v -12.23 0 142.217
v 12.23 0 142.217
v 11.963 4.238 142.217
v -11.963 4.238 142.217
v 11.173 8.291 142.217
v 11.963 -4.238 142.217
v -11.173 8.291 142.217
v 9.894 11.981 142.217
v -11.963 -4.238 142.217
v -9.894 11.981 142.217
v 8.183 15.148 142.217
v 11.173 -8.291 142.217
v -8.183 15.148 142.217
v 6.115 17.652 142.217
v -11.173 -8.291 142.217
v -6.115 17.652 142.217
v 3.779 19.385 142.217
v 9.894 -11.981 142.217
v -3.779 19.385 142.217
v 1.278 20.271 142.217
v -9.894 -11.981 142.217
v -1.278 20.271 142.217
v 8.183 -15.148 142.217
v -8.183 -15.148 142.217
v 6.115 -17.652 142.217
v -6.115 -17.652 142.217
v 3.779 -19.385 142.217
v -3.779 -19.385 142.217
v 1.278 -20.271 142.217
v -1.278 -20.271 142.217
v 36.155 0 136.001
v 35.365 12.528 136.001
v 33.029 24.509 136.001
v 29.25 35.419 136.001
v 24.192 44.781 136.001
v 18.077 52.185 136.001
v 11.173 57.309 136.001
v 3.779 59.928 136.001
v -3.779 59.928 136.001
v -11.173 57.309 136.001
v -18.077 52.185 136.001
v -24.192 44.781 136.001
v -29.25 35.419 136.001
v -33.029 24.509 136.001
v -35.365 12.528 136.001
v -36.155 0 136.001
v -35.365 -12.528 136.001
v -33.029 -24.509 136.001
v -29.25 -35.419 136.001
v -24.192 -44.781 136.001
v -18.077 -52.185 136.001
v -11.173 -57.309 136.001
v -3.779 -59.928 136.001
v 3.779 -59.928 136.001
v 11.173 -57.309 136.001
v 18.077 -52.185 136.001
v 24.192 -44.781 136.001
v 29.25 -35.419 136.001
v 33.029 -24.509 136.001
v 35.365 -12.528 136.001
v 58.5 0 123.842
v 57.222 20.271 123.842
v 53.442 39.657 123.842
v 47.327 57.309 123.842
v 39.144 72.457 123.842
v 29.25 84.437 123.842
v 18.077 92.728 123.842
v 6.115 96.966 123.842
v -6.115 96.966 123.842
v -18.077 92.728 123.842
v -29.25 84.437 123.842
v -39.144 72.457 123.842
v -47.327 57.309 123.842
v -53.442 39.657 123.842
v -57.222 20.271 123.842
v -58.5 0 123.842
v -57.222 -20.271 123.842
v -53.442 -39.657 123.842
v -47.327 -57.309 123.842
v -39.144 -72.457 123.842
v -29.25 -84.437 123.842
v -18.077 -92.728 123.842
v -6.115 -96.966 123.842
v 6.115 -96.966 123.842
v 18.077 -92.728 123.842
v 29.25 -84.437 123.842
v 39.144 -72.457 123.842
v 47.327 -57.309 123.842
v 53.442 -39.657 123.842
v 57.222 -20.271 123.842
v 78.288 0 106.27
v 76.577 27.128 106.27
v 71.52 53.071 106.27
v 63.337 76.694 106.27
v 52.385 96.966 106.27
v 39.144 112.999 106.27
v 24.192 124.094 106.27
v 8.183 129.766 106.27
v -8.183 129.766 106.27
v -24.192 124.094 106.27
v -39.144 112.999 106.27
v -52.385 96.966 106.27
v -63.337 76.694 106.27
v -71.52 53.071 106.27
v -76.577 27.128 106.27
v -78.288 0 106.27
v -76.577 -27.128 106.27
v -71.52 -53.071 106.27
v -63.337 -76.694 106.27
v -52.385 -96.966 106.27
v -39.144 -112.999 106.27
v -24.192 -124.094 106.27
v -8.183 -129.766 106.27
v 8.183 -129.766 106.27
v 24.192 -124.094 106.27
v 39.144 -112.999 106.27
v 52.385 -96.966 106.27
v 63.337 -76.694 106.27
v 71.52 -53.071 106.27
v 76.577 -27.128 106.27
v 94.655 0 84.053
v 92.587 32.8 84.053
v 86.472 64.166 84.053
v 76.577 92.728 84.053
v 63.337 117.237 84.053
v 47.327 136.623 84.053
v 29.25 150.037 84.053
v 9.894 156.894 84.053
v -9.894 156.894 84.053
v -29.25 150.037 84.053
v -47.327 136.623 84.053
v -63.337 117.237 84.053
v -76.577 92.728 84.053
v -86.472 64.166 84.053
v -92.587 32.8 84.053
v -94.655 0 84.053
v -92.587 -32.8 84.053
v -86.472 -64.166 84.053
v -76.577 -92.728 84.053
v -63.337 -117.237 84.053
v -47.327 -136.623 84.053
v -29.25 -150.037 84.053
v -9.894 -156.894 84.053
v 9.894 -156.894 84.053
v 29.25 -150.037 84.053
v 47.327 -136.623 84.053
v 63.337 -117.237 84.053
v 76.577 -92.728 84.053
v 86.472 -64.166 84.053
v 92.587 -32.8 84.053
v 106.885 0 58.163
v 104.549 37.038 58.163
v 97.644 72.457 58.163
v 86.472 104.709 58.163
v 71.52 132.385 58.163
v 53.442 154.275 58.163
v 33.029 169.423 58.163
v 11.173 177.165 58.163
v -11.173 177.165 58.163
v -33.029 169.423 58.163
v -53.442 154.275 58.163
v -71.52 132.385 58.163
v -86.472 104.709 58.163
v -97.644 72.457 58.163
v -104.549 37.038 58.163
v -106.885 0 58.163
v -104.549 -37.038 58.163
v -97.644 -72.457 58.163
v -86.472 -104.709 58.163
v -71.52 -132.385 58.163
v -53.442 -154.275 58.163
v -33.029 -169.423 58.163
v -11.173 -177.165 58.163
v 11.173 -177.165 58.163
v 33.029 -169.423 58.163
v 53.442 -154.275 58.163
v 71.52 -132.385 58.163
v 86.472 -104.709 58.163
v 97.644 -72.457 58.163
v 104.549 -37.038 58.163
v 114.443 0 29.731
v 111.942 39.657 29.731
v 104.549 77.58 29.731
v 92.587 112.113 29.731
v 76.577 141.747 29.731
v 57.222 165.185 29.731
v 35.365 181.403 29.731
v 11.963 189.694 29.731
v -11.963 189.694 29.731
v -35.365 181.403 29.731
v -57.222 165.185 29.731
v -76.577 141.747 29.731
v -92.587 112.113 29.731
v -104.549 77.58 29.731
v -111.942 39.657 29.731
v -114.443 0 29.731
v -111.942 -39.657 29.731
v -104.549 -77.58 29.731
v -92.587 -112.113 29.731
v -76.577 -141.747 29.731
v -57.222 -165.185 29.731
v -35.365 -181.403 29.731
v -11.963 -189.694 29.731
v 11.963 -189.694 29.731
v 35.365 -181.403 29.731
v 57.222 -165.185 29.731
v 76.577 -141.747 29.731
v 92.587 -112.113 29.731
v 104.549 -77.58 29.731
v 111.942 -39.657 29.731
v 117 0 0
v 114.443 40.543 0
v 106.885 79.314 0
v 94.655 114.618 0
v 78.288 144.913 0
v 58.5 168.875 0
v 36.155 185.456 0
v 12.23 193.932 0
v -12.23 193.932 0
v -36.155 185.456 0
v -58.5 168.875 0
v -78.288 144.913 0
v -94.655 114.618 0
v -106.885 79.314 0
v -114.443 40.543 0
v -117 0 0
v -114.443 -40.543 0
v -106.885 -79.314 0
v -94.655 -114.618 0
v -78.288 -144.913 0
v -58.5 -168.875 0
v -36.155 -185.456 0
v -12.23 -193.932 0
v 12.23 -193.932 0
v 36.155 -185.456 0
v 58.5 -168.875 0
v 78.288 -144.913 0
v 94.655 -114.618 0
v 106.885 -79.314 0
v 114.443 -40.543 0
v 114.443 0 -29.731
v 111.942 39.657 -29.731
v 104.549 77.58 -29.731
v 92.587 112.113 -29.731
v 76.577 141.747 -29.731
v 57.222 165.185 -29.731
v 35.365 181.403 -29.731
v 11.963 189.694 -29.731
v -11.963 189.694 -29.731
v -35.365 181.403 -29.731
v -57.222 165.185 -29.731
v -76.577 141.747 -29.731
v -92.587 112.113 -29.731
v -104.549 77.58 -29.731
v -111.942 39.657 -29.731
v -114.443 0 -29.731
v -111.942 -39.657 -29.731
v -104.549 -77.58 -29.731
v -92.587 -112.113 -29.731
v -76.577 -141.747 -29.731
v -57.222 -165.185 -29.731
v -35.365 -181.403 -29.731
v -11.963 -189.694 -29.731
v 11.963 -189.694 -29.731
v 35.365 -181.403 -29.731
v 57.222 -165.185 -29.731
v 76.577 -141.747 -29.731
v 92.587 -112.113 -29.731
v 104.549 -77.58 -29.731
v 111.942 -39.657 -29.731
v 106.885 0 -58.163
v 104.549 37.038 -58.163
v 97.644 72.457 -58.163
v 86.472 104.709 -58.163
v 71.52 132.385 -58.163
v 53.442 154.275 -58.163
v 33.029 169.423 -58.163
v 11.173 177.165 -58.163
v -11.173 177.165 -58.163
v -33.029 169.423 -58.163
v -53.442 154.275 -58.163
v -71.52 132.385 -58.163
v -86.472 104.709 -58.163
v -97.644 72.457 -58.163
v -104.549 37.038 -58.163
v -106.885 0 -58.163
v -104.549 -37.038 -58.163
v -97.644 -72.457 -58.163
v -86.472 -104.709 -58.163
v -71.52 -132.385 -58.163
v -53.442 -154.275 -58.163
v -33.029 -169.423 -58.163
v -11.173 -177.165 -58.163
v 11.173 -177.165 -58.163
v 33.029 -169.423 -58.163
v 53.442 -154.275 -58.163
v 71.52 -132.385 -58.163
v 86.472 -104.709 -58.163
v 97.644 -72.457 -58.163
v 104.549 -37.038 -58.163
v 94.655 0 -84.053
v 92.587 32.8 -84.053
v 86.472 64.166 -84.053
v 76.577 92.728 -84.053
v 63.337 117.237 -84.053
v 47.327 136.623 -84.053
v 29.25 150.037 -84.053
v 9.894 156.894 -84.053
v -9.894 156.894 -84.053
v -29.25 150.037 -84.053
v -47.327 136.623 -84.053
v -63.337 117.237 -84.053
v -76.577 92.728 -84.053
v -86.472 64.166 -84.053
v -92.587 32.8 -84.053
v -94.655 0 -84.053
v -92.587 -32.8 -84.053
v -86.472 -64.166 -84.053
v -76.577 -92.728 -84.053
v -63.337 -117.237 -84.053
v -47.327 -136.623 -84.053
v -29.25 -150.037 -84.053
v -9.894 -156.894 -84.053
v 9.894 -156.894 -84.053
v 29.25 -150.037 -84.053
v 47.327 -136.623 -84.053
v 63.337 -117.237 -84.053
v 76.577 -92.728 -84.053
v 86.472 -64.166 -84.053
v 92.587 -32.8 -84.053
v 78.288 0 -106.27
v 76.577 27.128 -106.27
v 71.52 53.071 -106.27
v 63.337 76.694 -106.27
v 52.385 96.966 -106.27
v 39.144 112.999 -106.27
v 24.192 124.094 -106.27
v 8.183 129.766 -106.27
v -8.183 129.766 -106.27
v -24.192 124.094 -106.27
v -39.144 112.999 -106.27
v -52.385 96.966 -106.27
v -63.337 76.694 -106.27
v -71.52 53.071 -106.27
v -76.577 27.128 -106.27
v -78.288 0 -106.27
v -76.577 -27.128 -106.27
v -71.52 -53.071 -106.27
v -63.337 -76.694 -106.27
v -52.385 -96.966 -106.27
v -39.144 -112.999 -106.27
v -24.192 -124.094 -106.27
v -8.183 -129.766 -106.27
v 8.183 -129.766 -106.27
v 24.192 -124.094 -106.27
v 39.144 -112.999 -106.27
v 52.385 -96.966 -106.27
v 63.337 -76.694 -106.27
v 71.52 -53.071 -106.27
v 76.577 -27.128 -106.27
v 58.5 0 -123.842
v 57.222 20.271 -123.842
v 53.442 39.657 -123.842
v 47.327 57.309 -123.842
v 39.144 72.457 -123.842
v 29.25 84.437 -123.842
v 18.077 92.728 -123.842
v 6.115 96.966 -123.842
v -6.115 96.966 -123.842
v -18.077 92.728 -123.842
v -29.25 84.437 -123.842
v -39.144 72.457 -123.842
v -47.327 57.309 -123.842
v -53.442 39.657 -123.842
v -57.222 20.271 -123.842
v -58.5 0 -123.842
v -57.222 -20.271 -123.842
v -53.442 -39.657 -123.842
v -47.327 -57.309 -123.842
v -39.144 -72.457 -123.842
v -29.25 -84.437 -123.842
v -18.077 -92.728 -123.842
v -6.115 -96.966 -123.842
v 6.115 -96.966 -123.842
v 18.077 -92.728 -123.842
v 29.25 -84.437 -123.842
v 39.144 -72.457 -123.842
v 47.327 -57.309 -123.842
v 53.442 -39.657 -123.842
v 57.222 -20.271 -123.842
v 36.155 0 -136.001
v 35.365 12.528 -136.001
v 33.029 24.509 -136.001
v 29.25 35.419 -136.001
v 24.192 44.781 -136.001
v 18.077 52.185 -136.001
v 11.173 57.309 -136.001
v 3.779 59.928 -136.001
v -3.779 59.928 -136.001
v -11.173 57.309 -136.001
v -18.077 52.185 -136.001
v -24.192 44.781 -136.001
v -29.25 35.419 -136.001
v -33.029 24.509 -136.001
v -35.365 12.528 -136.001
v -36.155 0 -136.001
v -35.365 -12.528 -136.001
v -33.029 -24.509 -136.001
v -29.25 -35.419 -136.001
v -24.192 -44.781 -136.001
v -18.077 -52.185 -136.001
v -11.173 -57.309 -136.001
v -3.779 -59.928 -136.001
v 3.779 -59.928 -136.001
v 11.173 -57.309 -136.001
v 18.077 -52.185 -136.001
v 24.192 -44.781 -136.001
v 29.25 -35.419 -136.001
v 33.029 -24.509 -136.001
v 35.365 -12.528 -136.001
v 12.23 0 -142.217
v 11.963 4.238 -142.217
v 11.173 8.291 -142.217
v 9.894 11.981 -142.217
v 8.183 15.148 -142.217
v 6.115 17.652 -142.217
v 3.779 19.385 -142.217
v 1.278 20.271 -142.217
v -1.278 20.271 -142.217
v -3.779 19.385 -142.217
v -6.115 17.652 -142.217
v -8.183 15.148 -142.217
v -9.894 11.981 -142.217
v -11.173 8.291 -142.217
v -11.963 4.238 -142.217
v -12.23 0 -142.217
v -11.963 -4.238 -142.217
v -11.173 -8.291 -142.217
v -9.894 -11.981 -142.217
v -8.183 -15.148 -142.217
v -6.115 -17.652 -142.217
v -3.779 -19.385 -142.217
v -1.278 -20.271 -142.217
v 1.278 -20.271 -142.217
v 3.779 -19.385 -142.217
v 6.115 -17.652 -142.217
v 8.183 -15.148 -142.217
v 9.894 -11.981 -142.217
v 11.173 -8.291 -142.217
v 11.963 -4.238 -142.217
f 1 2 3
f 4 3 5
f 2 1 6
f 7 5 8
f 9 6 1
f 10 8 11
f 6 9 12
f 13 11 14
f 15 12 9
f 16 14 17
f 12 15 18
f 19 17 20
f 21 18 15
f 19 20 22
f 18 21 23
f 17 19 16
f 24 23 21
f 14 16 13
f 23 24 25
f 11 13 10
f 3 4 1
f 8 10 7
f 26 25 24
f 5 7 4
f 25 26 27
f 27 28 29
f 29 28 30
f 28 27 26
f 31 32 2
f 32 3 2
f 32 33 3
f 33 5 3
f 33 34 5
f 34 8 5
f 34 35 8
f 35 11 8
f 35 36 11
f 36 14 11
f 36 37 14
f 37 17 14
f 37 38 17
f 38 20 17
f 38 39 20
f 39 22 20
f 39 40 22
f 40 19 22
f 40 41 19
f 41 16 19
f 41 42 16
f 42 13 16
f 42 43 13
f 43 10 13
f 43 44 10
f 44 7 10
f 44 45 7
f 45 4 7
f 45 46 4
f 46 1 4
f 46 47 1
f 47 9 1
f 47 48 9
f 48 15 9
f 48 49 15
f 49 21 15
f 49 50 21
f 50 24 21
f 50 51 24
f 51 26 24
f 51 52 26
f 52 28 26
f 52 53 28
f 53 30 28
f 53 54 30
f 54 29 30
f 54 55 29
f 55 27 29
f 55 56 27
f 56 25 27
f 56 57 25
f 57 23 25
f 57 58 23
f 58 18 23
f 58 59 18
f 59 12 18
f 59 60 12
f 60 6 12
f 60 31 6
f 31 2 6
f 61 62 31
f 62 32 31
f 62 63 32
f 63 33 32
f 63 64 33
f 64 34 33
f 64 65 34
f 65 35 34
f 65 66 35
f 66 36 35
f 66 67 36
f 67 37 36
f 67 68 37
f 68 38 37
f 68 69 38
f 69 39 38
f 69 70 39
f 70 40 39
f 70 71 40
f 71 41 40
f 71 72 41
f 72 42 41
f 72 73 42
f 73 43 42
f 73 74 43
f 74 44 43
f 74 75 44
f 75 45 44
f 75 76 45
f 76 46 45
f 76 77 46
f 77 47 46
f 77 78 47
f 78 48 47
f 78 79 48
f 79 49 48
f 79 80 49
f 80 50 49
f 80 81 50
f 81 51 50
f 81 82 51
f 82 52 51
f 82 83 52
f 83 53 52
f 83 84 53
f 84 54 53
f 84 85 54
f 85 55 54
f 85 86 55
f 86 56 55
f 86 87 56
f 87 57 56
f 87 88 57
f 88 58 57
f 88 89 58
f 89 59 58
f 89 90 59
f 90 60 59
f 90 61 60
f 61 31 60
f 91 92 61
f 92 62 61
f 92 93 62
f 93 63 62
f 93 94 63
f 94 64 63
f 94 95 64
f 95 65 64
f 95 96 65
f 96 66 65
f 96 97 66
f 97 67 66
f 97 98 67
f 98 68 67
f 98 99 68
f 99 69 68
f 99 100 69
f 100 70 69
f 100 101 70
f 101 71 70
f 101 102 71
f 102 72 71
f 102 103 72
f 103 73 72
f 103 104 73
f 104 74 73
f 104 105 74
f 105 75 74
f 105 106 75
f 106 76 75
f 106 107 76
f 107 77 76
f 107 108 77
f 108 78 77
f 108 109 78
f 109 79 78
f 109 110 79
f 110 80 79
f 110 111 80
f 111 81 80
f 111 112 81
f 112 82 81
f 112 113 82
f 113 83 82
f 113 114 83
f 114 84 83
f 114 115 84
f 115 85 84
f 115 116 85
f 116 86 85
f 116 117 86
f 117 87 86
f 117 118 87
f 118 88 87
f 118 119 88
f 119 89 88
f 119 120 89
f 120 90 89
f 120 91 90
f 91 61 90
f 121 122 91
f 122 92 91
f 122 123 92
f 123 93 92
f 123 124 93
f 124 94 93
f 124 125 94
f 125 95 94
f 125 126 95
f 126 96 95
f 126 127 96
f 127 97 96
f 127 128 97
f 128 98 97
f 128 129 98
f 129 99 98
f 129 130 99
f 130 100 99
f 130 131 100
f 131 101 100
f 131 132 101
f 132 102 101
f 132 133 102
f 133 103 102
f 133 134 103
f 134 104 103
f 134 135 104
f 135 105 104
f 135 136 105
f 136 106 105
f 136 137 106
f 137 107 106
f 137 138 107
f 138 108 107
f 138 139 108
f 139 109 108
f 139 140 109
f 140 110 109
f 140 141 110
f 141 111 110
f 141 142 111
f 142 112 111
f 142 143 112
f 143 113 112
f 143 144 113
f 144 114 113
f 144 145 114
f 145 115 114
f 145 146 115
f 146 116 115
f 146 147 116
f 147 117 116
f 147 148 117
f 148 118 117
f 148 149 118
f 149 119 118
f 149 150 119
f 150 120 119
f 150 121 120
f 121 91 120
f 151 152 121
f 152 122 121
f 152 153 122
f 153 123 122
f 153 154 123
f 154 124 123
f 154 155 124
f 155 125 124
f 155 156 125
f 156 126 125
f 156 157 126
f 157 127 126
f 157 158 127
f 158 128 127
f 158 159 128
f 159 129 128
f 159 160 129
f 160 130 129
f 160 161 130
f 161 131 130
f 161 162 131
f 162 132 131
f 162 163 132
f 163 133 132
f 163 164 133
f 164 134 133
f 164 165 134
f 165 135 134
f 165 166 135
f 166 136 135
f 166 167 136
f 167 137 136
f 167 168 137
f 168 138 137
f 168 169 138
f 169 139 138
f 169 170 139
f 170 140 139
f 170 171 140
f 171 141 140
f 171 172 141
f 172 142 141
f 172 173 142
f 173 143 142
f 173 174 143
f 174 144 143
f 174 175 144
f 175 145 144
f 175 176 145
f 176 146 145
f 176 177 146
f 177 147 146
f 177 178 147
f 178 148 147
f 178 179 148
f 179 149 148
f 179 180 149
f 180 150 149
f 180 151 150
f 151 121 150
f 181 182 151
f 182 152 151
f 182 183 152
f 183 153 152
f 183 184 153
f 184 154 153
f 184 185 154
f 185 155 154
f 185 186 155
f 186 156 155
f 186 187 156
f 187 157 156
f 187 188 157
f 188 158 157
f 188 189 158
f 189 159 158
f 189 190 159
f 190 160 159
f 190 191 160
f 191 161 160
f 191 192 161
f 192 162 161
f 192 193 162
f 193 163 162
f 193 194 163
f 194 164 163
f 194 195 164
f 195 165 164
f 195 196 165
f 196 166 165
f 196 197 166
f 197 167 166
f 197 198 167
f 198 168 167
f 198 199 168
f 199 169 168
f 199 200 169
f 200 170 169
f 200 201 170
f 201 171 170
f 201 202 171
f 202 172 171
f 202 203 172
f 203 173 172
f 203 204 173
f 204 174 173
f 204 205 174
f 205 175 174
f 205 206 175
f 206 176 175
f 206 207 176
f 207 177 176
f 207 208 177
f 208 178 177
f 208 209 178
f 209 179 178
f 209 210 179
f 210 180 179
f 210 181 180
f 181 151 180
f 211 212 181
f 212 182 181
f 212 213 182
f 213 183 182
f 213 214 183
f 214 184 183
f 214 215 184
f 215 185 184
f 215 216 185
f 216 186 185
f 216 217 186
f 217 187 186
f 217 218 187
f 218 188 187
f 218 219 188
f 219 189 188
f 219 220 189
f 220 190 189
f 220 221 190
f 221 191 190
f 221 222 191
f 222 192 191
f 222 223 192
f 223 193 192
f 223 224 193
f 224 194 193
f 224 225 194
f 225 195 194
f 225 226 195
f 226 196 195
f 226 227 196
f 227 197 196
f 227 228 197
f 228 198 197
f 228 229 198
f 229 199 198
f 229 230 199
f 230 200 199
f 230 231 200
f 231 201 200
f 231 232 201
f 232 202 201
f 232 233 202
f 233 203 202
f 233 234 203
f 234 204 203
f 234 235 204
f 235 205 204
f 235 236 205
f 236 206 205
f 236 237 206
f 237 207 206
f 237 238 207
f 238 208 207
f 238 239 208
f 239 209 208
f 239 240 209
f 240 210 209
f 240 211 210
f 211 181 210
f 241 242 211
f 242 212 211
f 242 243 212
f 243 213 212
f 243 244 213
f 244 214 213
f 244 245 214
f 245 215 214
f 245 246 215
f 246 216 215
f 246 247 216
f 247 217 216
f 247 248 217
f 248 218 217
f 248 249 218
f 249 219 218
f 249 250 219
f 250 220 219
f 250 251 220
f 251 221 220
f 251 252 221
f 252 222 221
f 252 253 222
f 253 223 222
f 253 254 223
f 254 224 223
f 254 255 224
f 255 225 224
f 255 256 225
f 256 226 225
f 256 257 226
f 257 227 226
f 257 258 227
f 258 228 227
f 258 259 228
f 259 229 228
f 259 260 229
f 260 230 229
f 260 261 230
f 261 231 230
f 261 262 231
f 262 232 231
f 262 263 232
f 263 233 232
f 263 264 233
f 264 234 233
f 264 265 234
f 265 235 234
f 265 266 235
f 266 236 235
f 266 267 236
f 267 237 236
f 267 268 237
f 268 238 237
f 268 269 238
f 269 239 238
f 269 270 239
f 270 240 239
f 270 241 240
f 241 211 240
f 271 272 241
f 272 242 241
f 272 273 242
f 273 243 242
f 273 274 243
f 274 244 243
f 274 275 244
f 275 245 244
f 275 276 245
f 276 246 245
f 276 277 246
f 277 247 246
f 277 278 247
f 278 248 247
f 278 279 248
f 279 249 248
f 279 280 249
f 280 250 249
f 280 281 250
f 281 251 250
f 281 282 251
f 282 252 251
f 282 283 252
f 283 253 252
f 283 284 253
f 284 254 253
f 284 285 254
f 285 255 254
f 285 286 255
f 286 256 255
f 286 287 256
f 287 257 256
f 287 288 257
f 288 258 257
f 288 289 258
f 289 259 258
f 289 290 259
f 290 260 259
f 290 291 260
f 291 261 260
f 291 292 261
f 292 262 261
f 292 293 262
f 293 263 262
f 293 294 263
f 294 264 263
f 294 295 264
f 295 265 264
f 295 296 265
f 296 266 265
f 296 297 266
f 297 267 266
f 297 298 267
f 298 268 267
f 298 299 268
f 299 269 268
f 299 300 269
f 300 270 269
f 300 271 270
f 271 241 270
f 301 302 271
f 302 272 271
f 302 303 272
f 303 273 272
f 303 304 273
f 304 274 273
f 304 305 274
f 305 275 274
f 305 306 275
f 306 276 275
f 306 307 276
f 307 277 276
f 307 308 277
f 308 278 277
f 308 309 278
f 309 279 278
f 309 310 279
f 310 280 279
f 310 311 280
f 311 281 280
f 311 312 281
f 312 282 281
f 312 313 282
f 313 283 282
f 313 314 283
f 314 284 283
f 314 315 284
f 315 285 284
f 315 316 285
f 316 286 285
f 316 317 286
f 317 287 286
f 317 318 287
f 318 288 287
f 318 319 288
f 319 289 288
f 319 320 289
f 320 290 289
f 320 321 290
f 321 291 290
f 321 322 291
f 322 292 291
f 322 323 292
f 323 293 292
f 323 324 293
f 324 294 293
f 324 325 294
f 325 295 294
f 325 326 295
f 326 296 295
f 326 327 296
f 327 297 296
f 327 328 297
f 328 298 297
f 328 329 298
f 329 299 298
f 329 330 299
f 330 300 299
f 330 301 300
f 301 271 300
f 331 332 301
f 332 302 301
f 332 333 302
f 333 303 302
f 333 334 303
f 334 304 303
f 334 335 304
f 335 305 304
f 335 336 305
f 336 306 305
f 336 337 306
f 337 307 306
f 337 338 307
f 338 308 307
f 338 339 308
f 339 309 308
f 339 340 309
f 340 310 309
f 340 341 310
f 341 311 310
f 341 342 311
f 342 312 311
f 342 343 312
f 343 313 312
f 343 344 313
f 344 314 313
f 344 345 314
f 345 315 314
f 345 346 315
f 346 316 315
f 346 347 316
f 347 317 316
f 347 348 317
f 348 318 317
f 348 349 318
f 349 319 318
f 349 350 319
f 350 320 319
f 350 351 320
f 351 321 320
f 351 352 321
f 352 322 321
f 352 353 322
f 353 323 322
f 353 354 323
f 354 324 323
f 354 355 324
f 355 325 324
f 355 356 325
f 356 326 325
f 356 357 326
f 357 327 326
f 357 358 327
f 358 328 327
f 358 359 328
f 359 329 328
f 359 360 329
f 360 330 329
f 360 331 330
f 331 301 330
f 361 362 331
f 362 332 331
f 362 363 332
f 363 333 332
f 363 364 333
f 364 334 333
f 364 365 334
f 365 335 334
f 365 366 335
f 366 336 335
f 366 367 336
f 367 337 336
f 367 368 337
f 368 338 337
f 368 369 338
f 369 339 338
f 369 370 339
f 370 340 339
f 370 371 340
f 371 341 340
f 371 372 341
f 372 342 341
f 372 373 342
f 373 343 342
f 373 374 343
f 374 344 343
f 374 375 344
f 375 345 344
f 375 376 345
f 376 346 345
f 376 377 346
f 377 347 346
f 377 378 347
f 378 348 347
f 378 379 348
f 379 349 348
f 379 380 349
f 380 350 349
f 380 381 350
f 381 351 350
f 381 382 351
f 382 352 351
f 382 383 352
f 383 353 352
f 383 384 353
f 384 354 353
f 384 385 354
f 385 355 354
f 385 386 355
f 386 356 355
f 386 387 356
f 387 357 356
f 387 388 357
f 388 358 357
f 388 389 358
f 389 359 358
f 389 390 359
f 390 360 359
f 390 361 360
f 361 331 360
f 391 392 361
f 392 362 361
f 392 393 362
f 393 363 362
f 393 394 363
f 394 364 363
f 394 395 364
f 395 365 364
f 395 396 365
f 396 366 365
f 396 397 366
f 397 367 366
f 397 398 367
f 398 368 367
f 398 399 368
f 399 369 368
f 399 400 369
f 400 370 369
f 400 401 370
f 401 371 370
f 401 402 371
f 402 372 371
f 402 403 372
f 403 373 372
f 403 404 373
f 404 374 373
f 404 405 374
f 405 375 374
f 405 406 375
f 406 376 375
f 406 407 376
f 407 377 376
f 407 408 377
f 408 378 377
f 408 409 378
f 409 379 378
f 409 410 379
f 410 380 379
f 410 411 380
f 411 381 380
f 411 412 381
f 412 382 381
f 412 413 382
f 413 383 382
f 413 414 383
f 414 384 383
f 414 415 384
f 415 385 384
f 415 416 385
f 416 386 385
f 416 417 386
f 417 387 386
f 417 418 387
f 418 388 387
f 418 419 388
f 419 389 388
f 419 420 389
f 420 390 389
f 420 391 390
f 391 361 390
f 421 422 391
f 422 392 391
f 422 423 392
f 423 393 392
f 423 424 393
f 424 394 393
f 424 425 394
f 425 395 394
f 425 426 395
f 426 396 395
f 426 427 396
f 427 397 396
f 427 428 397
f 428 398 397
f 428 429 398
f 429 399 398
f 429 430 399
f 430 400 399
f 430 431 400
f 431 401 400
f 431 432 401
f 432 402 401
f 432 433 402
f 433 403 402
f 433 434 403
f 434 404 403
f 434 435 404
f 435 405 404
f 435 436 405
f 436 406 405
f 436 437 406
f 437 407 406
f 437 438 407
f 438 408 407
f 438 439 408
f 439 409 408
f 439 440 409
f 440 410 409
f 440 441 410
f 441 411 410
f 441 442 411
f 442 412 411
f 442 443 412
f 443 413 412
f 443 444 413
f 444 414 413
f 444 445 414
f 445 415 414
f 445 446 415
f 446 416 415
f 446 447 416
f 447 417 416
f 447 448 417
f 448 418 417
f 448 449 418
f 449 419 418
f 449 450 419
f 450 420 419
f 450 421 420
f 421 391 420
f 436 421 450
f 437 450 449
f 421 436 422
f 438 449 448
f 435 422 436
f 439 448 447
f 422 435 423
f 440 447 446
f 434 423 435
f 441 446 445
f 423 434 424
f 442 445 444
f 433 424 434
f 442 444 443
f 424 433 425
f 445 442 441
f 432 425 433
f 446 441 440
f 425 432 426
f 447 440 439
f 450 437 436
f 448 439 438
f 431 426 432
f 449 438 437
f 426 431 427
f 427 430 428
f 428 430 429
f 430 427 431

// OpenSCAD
// Generated by SolidPython 1.0.1 on 2020-07-29 00:46:49


scale(v = [9, 15, 11]) {
	sphere(r = 13);
}
/***********************************************
*********      SolidPython code:      **********
************************************************
 
# import packages: SolidPython
from solid import *
from solid.utils import *
from itertools import chain, combinations, permutations


class Resize:

    def __init__(self, scad_file):
        self.scad_file = scad_file
        #self.scad_file = import_scad(scad_file)
        # cone/cylinder param:
        self.r1 = 0
        self.r2 = 0
        self.h = 0
        # rectangular prism param:
        self.w = 0
        self.l = 0
        # ellipse param:
        self.r = 0

    # import OpenScad code (file name corresponds to shape)


    # classify shape + parameters
    def assign(self, param1, param2, param3):
        if self.scad_file == 'cone.scad':
            self.r1 = param1
            self.r2 = param2
            self.h = param3
        elif self.scad_file == 'cylinder.scad':
            self.r1 = param1
            self.r2 = param2
            self.h = param3
        elif self.scad_file == 'rectangularPrism.scad':
            self.h = param1
            self.l = param2
            self.w = param3
        else:
            self.r = param1
            self.h = param2

    # resize parameters
    def iterate(self):
        x = range(3, 20, 2)
        i = 1
        if self.scad_file == 'cone.scad':
            tempList = list(permutations(x, 2))
            for temp in tempList:
                param1 = temp[0]
                param2 = temp[1]
                filepath = 'produced_scad_files/' + 'cone' + str(param1) + '_' + str(param2) + '_' + '.scad'
                scad_render_to_file(cylinder(h=param1, r1=param2, r2=0), filepath)

        elif self.scad_file == 'cylinder.scad':
            tempList = list(permutations(x, 3))
            for temp in tempList:
                param1 = temp[0]
                param2 = temp[1]
                filepath = 'produced_scad_files/' + 'cylinder' + str(param1) + '_' + str(param2) + '_' + '.scad'
                scad_render_to_file(cylinder(h=param1, r1=param2, r2=param2), filepath)

        elif self.scad_file == 'rectangularPrism.scad':
            tempList = list(permutations(x, 3))
            for temp in tempList:
                param1 = temp[0]
                param2 = temp[1]
                param3 = temp[2]
                filepath = 'produced_scad_files/' + 'rectangularPrism' + str(param1) + '_' + str(param2) + '_' + str(
                    param3) + '.scad'
                scad_render_to_file(cube(size=(param1, param2, param3)), filepath)

        elif self.scad_file == 'ellipse.scad':
            tempList = list(permutations(x, 4))
            for temp in tempList:
                param1 = temp[0]
                param2 = temp[1]
                param3 = temp[2]
                param4 = temp[3]
                filepath = 'produced_scad_files/' + 'ellipse' + str(param1) + '_' + str(param2) + '_' + str(param3) + '_' + str(param4) + '.scad'
                scad_render_to_file(scale([param1, param2, param3])(sphere(r=param4)), filepath)

    def render_to_scadfile(self):
        scad_render_to_file(scad, 'example.scad') 
 
************************************************/
